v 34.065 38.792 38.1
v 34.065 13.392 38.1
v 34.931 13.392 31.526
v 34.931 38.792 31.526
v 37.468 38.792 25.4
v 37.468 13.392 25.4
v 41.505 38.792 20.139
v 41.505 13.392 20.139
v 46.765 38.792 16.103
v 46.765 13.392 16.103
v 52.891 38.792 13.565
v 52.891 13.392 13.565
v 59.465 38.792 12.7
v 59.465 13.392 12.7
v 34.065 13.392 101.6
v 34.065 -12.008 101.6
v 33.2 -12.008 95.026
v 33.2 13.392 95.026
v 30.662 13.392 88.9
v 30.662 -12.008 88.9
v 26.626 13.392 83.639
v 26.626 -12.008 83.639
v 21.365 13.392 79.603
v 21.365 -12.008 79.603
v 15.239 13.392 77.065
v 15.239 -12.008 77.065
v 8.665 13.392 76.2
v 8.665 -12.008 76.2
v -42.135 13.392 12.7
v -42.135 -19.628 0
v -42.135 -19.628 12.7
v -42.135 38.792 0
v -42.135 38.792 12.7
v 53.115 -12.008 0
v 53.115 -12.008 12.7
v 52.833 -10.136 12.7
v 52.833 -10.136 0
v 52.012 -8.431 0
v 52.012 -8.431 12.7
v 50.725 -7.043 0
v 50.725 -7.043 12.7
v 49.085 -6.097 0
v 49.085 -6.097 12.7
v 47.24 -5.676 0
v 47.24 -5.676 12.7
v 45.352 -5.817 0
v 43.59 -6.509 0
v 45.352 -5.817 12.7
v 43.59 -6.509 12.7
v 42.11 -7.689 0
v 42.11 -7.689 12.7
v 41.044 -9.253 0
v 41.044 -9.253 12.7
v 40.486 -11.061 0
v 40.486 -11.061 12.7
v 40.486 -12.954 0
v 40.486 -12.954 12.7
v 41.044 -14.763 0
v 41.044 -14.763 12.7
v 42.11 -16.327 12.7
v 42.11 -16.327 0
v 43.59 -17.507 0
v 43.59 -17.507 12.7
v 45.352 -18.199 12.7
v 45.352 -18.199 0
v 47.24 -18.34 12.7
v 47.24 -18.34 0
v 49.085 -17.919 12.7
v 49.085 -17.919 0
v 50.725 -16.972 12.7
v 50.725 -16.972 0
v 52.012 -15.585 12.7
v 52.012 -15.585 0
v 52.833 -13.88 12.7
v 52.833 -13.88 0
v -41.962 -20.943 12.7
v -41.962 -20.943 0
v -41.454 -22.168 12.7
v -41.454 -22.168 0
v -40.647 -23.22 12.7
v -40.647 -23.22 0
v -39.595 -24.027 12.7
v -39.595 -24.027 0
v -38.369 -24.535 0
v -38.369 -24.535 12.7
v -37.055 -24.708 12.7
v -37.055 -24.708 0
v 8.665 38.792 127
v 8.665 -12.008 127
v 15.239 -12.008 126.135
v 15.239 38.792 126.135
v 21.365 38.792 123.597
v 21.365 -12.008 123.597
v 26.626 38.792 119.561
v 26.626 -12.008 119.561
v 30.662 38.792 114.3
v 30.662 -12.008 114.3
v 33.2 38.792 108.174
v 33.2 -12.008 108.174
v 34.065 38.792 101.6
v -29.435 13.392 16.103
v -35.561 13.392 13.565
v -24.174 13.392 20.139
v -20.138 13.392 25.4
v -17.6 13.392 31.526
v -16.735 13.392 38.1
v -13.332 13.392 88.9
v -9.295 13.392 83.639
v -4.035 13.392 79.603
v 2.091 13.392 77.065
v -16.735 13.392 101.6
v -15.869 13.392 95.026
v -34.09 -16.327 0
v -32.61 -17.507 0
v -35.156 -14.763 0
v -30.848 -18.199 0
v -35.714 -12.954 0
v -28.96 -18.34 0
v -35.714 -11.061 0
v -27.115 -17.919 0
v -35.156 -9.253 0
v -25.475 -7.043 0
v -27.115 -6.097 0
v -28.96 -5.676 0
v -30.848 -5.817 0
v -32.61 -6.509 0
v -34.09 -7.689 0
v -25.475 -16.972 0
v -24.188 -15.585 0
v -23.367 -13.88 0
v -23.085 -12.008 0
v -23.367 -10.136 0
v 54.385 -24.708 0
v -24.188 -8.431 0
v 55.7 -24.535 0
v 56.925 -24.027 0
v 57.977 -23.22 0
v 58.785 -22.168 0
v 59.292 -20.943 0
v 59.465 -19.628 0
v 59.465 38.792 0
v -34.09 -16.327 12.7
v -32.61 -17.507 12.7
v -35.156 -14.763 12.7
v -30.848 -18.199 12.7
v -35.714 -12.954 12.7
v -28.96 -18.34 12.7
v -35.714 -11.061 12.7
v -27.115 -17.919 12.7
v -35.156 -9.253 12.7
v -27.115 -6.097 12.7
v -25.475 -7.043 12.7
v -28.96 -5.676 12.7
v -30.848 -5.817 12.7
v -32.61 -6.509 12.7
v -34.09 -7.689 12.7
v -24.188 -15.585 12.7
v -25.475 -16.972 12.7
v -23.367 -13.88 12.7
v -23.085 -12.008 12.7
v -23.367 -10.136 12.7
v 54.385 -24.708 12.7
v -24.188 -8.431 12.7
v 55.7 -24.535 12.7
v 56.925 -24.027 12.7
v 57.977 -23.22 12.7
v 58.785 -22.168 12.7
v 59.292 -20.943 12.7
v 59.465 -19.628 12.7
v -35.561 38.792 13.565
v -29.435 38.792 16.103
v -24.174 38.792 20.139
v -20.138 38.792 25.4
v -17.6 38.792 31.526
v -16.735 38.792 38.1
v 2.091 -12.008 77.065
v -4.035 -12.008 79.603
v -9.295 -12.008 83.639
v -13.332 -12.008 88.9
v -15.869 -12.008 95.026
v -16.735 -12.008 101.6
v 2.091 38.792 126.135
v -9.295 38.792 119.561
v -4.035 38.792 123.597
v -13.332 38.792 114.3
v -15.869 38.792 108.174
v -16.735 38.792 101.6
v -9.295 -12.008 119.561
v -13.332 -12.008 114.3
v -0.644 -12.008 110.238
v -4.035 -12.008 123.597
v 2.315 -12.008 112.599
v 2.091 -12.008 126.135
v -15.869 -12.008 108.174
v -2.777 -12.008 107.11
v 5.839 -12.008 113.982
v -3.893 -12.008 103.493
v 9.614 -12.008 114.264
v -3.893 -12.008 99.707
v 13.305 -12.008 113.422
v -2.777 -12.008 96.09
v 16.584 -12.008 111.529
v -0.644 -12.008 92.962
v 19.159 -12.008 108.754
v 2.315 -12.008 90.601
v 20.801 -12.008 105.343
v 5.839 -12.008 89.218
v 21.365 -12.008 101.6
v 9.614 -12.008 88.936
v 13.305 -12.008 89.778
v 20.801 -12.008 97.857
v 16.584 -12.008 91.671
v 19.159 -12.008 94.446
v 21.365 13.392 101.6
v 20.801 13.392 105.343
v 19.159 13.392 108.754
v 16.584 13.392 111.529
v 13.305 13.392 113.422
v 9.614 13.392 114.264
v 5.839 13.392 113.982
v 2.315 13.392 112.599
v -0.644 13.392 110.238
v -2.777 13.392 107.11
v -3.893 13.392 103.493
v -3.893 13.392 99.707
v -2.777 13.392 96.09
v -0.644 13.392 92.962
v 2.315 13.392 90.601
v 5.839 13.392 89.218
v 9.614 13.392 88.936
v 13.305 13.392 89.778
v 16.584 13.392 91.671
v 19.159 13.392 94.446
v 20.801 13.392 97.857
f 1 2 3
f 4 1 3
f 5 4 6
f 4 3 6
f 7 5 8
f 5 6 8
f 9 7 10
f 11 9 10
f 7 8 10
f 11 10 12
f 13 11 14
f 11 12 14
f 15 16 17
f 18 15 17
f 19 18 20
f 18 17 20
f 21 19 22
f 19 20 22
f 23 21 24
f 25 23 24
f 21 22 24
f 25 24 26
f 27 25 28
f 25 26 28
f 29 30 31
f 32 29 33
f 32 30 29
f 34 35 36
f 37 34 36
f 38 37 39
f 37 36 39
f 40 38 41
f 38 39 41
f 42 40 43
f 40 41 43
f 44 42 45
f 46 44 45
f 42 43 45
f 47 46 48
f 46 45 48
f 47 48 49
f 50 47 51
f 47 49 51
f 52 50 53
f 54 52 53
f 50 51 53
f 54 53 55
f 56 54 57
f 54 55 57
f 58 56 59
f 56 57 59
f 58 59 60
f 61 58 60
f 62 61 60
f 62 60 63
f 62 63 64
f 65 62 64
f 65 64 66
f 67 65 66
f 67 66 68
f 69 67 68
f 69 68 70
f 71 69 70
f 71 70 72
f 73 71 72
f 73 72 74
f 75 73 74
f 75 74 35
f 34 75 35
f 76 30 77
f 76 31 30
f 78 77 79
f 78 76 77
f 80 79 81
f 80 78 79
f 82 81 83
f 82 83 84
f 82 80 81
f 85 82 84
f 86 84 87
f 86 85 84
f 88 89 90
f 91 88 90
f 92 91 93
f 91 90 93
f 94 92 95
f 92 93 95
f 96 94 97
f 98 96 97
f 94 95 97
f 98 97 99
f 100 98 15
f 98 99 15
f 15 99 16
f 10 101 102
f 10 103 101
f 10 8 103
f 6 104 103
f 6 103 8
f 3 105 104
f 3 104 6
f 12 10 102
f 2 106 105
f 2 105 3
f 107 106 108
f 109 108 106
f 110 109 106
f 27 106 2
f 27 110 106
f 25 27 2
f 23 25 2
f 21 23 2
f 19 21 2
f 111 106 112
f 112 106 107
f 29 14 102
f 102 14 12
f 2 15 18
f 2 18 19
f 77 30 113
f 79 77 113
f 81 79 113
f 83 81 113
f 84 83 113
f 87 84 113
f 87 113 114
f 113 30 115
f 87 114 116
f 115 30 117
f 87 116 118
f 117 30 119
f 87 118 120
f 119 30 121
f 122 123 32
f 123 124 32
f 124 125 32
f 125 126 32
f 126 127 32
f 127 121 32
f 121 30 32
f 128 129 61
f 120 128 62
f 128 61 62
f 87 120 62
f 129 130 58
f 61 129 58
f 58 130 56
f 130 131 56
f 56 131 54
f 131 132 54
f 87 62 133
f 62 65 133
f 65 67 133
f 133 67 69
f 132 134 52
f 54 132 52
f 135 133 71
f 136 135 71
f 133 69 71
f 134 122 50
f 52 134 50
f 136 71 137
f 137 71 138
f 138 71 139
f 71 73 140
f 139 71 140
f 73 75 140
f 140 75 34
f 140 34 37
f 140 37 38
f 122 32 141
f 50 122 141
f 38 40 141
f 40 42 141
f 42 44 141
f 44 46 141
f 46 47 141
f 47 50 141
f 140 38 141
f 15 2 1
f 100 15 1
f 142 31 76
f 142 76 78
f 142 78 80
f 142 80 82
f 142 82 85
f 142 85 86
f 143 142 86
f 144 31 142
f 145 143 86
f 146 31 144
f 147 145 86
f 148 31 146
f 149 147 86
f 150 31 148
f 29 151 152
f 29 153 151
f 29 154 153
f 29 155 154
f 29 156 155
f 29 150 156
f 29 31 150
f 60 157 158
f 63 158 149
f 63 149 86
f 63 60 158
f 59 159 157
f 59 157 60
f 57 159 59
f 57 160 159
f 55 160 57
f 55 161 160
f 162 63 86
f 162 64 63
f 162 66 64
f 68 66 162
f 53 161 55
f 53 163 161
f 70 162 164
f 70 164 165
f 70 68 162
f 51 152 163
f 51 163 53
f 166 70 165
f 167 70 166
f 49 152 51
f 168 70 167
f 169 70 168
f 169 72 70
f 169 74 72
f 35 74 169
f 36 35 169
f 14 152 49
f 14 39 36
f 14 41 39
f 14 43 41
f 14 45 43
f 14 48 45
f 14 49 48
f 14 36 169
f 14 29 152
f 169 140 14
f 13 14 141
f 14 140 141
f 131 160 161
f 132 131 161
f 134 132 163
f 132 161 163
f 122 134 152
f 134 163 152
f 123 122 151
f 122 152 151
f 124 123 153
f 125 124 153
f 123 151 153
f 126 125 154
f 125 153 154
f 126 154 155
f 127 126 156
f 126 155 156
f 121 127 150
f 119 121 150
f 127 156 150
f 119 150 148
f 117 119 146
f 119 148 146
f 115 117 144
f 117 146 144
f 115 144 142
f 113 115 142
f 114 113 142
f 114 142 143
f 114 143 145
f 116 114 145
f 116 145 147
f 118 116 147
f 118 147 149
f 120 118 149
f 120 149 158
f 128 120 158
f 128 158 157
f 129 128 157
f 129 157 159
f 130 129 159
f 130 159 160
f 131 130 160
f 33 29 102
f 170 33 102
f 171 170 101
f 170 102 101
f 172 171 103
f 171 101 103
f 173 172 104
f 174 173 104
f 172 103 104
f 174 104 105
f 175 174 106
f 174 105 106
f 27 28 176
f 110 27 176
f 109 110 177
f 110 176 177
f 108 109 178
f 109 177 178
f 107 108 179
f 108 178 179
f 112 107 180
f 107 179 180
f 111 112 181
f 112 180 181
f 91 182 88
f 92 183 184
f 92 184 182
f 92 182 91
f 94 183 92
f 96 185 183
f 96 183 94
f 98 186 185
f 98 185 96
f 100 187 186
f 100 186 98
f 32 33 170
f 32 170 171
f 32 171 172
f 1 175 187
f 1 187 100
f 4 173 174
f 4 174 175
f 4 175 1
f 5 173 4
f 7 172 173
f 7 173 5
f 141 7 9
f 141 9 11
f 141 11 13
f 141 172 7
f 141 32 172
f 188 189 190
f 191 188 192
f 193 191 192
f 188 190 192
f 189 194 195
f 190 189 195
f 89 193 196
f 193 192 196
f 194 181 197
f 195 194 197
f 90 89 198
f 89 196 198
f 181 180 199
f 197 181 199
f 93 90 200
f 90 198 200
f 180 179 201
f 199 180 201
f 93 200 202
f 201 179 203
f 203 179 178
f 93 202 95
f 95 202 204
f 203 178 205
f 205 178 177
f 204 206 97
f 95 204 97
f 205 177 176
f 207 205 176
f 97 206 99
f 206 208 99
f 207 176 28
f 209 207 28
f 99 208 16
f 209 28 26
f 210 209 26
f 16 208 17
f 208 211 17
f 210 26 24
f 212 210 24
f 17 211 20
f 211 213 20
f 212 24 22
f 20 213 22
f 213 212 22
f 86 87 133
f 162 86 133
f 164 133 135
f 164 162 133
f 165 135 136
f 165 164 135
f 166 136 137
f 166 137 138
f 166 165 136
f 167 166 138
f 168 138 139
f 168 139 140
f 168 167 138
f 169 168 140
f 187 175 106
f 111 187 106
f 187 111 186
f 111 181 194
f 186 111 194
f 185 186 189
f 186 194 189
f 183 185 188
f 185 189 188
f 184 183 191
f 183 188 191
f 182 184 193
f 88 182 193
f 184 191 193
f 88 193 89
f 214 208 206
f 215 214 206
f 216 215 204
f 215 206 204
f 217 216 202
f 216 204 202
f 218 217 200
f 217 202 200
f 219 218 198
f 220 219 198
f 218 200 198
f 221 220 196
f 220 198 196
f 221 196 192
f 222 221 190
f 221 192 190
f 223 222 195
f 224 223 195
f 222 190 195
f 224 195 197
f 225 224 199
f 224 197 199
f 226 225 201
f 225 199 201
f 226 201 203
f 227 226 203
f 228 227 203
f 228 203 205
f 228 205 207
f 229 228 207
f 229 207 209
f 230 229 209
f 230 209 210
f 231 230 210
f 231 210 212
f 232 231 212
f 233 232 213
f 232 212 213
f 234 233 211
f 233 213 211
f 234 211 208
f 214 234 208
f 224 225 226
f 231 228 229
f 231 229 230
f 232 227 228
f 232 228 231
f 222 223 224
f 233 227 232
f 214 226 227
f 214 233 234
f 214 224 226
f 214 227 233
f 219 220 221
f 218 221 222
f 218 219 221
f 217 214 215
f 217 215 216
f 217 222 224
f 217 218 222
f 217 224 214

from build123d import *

# Parameters (mm, degrees)
F0_W      = 101.6
F0_H      = 63.5
F1_DEPTH  = 12.7
F2_R      = 5.08
F3_W      = 101.6
F3_H      = 25.4
F4_DEPTH  = 63.5
F5_W      = 25.4
F5_H      = 25.4
F6_DEPTH  = 38.1
F8_DEPTH  = 25.4
F9_W      = 50.8
F9_H      = 25.4
F10_DEPTH = 50.8
F12_DEPTH = 25.4
F14_DEPTH = 50.8
F15_R     = 12.7
F16_DEPTH = 25.4
F17_R     = 6.35
F18_DEPTH = 25.4


with BuildPart() as f1:
    # F0 (on Top) → F1 (new body)
    with BuildSketch(Plane.XY):
        with Locations((8.665344, 7.042157)):
            Rectangle(F0_W, F0_H)
    extrude(amount=F1_DEPTH)

    # F2
    f2_edges = [f1.edges().sort_by_distance(p)[0] for p in [
        (59.465344, -24.707843, 6.35),
        (-42.134656, -24.707843, 6.35),
    ]]
    fillet(f2_edges, radius=F2_R)

    # F3 (on face) → F4 (join)
    with BuildSketch(Plane.XY.offset(12.7)):
        with Locations((8.665344, 26.092157)):
            Rectangle(F3_W, F3_H)
    extrude(amount=F4_DEPTH)

    # F5 (on face) → F6 (cut)
    with BuildSketch(Plane.XY.offset(76.2)):
        with Locations((-29.434656, 26.092157)):
            Rectangle(F5_W, F5_H)
        with Locations((46.765344, 26.092157)):
            Rectangle(F5_W, F5_H)
    extrude(amount=-F6_DEPTH, mode=Mode.SUBTRACT)

    # F7 (on face) → F8 (cut)
    with BuildSketch(Plane.XZ.offset(-13.392157)):
        with BuildLine():
            Line((-42.134656, 38.1), (-42.134656, 12.7))
            ThreePointArc((-42.134656, 12.7), (-24.174144, 20.139488), (-16.734656, 38.1))
            Line((-16.734656, 38.1), (-42.134656, 38.1))
        make_face()
        with BuildLine():
            Line((59.465344, 38.1), (34.065344, 38.1))
            ThreePointArc((34.065344, 38.1), (41.504832, 20.139488), (59.465344, 12.7))
            Line((59.465344, 12.7), (59.465344, 38.1))
        make_face()
    extrude(amount=-F8_DEPTH, mode=Mode.SUBTRACT)

    # F9 (on face) → F10 (join)
    with BuildSketch(Plane.XY.offset(76.2)):
        with Locations((8.665344, 0.692157)):
            Rectangle(F9_W, F9_H)
        with Locations((8.665344, 26.092157)):
            Rectangle(F9_W, F9_H)
    extrude(amount=F10_DEPTH)

    # F11 (on face) → F12 (cut)
    with BuildSketch(Plane.XZ.offset(12.007843)):
        with BuildLine():
            Line((-16.734656, 76.2), (8.665344, 76.2))
            ThreePointArc((8.665344, 76.2), (-9.295168, 83.639488), (-16.734656, 101.6))
            Line((-16.734656, 101.6), (-16.734656, 76.2))
        make_face()
        with BuildLine():
            Line((34.065344, 76.2), (34.065344, 101.6))
            ThreePointArc((34.065344, 101.6), (26.625856, 83.639488), (8.665344, 76.2))
            Line((8.665344, 76.2), (34.065344, 76.2))
        make_face()
    extrude(amount=-F12_DEPTH, mode=Mode.SUBTRACT)

    # F13 (on face) → F14 (cut)
    with BuildSketch(Plane.XZ.offset(12.007843)):
        with BuildLine():
            ThreePointArc((-16.734656, 101.6), (-9.295168, 119.560512), (8.665344, 127))
            Line((8.665344, 127), (-16.734656, 127))
            Line((-16.734656, 127), (-16.734656, 101.6))
        make_face()
        with BuildLine():
            ThreePointArc((8.665344, 127), (26.625856, 119.560512), (34.065344, 101.6))
            Line((34.065344, 101.6), (34.065344, 127))
            Line((34.065344, 127), (8.665344, 127))
        make_face()
    extrude(amount=-F14_DEPTH, mode=Mode.SUBTRACT)

    # F15 (on face) → F16 (cut)
    with BuildSketch(Plane.XZ.offset(12.007843)):
        with Locations((8.665344, 101.6)):
            Circle(F15_R)
    extrude(amount=-F16_DEPTH, mode=Mode.SUBTRACT)

    # F17 (on face) → F18 (cut)
    with BuildSketch(Plane.XY.offset(12.7)):
        with Locations((-29.434656, -12.007843)):
            Circle(F17_R)
        with Locations((46.765344, -12.007843)):
            Circle(F17_R)
    extrude(amount=-F18_DEPTH, mode=Mode.SUBTRACT)


solid = f1.part
